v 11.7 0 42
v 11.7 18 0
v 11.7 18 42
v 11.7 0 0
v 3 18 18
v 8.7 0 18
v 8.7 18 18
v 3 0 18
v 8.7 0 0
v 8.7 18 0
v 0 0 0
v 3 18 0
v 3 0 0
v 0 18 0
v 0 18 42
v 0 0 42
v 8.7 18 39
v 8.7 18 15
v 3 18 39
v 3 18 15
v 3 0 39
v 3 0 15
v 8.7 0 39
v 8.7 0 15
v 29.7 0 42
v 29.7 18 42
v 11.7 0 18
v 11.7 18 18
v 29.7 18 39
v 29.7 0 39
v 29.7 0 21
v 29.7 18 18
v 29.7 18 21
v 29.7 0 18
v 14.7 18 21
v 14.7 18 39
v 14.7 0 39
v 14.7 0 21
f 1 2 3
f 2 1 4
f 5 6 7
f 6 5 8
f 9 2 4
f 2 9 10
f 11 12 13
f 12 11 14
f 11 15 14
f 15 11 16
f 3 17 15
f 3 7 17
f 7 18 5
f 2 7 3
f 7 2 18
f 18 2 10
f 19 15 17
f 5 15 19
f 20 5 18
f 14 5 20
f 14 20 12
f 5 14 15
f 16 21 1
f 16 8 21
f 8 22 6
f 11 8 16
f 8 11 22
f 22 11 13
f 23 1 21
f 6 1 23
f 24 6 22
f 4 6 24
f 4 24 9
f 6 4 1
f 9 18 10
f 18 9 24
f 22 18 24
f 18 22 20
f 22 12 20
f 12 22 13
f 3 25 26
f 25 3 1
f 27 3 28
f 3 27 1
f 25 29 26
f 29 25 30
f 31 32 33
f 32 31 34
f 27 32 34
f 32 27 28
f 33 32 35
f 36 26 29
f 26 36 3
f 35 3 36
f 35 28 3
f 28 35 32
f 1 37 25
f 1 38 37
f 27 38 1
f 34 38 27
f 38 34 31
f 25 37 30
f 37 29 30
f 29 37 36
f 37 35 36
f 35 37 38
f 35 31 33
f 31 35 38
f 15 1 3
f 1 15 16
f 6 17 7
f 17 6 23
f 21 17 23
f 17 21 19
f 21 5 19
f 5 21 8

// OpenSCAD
union () {
  difference () {
    cube ([11.7, 18, 18]);
    translate ([3, -0.5, -1]) {
      cube ([5.7, 19, 16]);
    }
  }
  translate ([29.7, 0, 18]) {
    rotate (a=-90.0, v=[0, 1, 0]) {
      difference () {
        cube ([24, 18, 18]);
        translate ([3, -0.5, -1]) {
          cube ([18, 19, 16]);
        }
      }
    }
  }
  translate ([0, 0, 18]) {
    difference () {
      cube ([11.7, 18, 24]);
      translate ([3, -0.5, -1]) {
        cube ([5.7, 19, 22]);
      }
    }
  }
}
